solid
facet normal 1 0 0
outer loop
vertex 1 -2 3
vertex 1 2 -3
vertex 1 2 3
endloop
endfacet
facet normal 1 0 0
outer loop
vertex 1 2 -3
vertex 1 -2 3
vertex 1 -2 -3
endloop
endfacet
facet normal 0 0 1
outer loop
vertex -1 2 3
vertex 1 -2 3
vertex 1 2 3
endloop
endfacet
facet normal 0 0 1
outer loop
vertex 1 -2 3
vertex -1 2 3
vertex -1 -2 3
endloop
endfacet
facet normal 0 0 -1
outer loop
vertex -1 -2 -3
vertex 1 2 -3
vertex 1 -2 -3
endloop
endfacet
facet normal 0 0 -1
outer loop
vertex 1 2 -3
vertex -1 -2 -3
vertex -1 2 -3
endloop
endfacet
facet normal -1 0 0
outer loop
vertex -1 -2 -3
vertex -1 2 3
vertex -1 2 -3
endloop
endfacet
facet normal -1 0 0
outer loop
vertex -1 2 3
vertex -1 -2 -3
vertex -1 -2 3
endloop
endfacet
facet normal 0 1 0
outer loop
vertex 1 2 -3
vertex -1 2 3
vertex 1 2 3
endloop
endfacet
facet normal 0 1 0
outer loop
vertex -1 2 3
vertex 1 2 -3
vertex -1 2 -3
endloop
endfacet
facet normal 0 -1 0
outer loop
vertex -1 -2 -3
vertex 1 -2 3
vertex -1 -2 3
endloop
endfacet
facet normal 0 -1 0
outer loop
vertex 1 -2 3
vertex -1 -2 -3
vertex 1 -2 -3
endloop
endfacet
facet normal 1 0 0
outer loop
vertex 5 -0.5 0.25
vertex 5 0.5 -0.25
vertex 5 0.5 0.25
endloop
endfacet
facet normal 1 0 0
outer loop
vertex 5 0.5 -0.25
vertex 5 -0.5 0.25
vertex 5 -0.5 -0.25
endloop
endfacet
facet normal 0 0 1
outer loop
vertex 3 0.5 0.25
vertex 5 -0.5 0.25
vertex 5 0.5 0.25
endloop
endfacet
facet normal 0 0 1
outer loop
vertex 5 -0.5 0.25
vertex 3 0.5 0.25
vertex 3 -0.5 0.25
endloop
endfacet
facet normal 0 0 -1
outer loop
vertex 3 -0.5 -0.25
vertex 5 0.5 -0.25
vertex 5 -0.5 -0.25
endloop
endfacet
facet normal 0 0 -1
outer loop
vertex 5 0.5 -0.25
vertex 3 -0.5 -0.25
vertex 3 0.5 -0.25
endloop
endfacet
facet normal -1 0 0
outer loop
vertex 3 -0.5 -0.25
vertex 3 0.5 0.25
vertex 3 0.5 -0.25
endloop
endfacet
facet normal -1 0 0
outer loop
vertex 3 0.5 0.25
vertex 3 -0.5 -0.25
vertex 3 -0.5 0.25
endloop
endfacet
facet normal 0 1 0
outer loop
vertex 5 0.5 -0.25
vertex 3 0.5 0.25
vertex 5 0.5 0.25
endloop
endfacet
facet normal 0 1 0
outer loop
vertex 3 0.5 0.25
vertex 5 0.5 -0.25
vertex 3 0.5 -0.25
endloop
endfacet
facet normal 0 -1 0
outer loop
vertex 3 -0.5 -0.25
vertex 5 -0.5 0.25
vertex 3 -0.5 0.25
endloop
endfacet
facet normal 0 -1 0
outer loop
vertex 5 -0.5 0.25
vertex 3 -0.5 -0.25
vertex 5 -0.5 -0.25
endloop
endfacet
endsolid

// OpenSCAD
translate([-1, -2, -3])
cube([2, 4, 6]);

translate([3, -0.5, -0.25])
cube([2, 1, 0.5]);
